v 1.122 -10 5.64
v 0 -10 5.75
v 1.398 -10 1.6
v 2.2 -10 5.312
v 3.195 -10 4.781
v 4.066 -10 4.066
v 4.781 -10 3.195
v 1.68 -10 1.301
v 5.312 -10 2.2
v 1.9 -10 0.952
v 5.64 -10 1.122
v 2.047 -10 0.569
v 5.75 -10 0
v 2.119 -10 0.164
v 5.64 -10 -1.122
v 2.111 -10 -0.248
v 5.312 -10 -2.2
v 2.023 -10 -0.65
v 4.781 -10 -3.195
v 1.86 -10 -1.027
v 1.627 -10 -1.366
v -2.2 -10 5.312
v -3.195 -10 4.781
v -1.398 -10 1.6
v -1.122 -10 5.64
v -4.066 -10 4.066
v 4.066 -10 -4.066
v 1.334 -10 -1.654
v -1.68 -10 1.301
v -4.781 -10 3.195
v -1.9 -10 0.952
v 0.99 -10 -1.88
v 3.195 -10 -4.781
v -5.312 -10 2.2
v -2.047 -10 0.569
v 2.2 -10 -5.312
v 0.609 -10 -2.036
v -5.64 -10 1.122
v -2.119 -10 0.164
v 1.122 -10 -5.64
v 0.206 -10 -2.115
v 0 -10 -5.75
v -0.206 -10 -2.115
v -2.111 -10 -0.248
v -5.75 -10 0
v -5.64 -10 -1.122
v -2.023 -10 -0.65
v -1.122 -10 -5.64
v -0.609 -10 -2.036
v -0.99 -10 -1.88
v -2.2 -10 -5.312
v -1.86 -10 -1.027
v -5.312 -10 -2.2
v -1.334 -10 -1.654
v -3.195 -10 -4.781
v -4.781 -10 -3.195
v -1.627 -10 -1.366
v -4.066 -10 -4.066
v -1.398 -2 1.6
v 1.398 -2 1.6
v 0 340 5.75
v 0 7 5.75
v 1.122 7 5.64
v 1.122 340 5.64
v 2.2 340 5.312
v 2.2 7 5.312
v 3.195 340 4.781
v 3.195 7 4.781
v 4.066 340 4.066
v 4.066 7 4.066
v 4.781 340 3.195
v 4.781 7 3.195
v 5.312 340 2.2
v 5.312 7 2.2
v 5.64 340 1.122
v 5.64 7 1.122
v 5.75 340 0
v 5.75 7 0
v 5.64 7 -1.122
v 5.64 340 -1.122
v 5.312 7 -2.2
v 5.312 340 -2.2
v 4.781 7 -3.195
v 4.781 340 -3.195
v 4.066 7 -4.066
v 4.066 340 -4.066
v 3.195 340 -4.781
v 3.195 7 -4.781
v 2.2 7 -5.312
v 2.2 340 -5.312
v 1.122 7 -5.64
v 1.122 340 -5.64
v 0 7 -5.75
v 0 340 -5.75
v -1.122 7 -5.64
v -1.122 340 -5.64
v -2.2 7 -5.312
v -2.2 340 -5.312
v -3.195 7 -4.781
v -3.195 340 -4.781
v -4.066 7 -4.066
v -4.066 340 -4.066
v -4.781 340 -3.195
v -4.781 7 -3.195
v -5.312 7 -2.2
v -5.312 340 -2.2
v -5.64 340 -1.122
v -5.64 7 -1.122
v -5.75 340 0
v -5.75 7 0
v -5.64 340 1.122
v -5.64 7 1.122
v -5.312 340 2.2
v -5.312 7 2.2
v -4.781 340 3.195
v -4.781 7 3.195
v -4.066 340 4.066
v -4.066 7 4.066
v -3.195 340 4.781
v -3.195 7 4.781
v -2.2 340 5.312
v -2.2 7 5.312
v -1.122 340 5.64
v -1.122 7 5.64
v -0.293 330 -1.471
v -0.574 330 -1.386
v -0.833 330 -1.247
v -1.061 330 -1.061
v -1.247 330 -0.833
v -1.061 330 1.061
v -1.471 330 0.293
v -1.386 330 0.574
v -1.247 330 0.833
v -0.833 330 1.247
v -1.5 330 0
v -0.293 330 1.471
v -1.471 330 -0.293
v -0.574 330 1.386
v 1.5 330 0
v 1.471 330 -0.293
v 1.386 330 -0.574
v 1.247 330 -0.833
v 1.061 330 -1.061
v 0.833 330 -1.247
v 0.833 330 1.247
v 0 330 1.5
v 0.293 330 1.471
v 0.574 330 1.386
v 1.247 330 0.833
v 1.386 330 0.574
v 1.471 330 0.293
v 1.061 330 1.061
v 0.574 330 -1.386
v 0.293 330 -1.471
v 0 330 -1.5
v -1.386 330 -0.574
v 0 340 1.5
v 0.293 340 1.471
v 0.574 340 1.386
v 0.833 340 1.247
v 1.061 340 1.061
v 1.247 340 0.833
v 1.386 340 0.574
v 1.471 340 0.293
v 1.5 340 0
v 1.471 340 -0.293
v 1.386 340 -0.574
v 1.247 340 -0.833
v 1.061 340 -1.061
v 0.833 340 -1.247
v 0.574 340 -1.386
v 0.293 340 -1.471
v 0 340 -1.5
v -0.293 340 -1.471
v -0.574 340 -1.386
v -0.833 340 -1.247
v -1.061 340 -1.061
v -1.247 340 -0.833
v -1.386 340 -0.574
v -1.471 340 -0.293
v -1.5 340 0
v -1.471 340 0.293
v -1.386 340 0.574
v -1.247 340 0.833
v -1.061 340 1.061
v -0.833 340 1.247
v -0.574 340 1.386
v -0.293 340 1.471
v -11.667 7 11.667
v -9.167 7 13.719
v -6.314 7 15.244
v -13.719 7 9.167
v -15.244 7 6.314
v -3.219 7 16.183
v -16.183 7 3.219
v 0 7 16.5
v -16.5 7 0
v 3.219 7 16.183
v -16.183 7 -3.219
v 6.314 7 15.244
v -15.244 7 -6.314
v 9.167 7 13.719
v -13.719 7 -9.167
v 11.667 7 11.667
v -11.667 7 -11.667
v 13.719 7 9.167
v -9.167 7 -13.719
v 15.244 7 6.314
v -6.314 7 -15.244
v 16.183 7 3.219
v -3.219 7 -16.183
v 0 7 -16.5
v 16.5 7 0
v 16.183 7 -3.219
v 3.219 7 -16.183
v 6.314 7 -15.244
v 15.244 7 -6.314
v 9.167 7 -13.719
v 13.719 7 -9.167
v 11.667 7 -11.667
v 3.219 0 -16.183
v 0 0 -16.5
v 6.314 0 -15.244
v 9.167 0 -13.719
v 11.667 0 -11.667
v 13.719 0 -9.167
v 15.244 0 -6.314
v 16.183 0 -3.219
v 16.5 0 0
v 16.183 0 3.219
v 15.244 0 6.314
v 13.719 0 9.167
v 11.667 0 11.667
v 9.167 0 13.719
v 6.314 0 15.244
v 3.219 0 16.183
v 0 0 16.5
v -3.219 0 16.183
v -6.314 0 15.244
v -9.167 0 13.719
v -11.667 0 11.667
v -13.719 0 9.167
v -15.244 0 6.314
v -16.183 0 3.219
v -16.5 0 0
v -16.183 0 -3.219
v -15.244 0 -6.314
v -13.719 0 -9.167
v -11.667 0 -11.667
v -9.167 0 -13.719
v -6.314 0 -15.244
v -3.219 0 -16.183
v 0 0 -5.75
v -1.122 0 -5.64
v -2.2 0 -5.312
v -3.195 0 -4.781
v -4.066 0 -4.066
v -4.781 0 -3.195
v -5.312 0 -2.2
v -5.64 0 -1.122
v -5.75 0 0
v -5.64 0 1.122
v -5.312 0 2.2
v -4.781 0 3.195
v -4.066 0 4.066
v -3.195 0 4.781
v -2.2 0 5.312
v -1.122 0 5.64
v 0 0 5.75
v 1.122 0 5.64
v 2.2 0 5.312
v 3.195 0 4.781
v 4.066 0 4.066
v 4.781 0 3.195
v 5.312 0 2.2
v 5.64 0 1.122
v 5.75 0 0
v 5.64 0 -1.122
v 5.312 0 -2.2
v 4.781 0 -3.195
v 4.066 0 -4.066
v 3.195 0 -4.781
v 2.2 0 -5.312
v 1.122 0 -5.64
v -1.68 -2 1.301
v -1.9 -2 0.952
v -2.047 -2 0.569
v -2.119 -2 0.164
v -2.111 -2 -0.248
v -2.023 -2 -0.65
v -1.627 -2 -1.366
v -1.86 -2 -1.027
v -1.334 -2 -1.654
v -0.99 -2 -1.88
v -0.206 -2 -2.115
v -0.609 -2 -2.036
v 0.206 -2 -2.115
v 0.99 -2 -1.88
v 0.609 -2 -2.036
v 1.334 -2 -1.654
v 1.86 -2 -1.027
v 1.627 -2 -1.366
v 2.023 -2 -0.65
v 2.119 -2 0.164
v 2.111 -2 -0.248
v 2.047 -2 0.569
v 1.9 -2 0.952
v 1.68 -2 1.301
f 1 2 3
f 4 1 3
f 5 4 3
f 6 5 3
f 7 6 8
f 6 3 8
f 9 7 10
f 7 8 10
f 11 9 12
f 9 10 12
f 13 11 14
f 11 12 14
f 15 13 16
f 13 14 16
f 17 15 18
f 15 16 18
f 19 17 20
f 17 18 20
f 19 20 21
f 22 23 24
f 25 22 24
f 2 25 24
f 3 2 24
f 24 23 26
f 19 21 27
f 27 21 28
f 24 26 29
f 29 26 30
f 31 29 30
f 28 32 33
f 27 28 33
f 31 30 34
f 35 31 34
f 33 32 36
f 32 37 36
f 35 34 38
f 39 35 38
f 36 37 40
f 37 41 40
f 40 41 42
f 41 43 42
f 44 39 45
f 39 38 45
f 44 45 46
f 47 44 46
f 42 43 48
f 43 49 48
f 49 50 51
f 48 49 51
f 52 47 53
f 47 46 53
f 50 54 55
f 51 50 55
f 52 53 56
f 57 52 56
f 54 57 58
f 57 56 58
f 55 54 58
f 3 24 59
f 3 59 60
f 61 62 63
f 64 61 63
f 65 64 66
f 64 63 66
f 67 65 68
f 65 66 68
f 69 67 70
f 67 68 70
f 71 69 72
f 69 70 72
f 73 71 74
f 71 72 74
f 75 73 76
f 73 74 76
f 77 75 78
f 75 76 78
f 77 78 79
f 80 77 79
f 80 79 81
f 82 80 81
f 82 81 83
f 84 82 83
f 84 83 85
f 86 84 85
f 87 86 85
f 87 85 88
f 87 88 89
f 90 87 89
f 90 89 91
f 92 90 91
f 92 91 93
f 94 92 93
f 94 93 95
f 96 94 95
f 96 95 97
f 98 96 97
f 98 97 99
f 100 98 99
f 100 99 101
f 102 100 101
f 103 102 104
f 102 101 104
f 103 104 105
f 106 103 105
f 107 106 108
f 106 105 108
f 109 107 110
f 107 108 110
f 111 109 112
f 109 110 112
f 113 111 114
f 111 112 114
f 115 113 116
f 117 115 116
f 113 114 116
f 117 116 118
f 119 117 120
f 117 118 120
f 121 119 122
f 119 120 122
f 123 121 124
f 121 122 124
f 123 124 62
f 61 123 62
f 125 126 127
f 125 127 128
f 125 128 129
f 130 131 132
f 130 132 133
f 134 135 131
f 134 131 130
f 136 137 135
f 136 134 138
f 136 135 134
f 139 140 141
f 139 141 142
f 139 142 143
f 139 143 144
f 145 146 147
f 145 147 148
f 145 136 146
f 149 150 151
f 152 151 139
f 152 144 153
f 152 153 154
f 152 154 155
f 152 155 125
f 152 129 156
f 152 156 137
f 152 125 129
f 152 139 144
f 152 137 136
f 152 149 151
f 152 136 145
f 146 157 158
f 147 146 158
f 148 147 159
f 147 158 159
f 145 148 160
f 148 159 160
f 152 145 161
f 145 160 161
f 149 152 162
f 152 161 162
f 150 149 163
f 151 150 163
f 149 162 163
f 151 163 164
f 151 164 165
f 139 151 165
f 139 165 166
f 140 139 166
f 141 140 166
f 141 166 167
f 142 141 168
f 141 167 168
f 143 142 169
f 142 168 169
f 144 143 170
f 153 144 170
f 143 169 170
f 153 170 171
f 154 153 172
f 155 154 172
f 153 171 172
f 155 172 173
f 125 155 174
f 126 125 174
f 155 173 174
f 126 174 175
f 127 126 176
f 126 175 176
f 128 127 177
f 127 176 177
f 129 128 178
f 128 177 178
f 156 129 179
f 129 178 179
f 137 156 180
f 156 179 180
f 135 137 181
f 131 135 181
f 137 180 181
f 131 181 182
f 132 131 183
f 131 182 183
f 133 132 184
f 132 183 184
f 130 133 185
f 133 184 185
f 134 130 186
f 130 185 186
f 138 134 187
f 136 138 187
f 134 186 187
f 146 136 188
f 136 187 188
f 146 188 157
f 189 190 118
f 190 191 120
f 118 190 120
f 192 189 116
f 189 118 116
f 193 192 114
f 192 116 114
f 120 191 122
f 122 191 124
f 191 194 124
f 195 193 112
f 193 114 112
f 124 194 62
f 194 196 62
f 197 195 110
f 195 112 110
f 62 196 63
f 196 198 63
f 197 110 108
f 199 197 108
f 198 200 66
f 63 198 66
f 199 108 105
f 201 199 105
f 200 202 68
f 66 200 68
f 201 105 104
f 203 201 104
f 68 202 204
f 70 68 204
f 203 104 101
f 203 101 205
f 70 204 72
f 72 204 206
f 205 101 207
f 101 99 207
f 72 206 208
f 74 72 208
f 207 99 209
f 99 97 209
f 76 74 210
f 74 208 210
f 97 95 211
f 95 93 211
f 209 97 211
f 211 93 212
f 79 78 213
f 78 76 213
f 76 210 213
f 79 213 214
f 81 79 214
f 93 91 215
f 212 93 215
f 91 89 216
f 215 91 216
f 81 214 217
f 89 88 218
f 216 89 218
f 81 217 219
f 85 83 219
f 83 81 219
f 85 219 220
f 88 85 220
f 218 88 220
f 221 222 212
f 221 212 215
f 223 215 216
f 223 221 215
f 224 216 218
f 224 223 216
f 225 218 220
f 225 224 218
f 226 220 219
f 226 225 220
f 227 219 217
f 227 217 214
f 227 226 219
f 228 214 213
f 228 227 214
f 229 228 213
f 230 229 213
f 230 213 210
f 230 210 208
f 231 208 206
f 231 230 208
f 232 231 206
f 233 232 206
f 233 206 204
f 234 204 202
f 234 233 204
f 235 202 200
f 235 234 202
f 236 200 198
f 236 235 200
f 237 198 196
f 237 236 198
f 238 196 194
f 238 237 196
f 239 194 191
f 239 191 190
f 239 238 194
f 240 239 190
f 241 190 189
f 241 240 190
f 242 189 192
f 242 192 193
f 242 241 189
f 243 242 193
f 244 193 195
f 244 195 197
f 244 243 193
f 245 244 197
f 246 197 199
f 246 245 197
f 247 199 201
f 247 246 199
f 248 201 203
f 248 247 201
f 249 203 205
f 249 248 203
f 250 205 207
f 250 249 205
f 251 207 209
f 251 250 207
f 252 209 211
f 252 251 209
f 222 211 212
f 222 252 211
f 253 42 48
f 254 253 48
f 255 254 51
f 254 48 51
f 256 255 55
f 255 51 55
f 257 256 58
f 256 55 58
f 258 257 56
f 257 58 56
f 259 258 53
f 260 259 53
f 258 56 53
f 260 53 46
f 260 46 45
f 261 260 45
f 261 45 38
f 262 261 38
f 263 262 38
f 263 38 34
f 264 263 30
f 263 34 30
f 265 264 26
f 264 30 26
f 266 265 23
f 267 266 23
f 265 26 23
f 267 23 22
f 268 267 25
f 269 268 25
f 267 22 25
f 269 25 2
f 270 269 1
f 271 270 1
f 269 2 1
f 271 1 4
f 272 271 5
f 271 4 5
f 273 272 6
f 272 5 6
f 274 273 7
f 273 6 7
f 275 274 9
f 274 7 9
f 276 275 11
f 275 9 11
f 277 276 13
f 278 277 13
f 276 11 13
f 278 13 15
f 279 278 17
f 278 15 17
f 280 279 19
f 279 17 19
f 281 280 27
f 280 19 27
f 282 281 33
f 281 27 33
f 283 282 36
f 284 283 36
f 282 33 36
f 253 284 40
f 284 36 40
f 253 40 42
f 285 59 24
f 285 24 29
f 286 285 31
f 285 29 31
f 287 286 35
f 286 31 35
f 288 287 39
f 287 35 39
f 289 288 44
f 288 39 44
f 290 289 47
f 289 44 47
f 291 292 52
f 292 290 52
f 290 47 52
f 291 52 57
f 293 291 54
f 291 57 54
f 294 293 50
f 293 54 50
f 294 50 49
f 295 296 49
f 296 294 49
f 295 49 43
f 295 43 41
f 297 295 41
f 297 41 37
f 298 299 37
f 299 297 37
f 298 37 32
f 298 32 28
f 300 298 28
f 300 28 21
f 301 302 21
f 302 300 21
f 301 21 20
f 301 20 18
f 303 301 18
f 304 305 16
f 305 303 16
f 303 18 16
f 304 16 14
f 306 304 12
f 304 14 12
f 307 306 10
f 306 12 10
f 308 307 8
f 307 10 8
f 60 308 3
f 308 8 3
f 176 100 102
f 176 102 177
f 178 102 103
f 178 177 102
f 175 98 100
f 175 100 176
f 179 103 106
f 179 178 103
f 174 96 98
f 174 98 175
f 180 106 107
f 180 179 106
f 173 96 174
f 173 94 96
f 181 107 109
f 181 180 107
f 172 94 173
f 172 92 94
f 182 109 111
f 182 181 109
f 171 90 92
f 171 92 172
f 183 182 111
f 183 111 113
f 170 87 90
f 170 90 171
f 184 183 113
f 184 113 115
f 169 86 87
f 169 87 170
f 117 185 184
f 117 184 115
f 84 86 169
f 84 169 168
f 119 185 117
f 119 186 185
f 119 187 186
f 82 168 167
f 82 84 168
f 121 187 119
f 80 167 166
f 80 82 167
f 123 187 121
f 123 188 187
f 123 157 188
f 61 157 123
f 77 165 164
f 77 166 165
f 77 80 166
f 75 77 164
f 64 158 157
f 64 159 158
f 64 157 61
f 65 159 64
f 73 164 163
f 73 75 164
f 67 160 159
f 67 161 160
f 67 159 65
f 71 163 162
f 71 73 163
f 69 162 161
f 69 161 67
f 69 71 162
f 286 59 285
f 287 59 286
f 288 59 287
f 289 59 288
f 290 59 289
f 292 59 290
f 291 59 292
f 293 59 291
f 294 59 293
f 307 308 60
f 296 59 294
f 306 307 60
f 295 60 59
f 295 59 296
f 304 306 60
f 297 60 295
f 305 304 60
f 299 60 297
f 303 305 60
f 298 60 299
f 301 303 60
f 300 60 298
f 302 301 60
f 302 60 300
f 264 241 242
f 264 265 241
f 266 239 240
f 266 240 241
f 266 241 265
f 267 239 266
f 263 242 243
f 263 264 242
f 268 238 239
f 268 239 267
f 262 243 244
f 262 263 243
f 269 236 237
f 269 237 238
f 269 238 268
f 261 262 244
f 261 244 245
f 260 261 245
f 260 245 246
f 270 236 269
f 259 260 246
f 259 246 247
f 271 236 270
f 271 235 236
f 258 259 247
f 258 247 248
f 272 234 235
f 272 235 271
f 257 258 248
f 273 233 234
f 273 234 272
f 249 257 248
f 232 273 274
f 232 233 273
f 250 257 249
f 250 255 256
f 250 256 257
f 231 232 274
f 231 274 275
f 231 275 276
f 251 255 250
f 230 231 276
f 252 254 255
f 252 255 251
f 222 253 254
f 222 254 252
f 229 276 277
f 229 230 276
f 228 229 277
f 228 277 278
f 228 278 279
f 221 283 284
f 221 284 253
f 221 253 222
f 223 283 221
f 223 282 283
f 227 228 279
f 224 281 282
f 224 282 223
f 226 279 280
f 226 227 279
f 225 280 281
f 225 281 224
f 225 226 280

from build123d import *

# Parameters (mm, degrees)
SKETCH1_R           = 5.75
SKETCH1_R_2         = 2
BOSS_EXTRUDE1_DEPTH = 340
SKETCH33_R          = 16.5
BOSS_EXTRUDE2_DEPTH = 7
BOSS_EXTRUDE5_START = -10
SKETCH1_4_R         = 5.75
SKETCH1_4_R_2       = 2
BOSS_EXTRUDE5_DEPTH = 10
SKETCH38_R          = 2.125
CUT_EXTRUDE1_DEPTH  = 8
BOSS_EXTRUDE6_START = 8
BOSS_EXTRUDE6_DEPTH = 8
SKETCH40_R          = 1.5
CUT_EXTRUDE2_DEPTH  = 10


with BuildPart() as part:
    # Sketch1 → Boss-Extrude1 (new body)
    # profile 1 of 2: a face of its own
    with BuildSketch(Plane(origin=(0, 0, 0), x_dir=(1, 0, 0), z_dir=(0, 1, 0))):
        with Locations(Location((0, 0, 0), (0, 0, 270))):
            Circle(SKETCH1_R)
        Circle(SKETCH1_R_2, mode=Mode.SUBTRACT)
    # profile 2 of 2: a face of its own
    with BuildSketch(Plane(origin=(0, 0, 0), x_dir=(1, 0, 0), z_dir=(0, 1, 0))):
        Circle(SKETCH1_R_2)
    extrude(amount=BOSS_EXTRUDE1_DEPTH)

    # Sketch33 → Boss-Extrude2 (add)
    with BuildSketch(Plane.XZ):
        with Locations(Location((0, 0, 0), (0, 0, 270))):
            Circle(SKETCH33_R)
    extrude(amount=-BOSS_EXTRUDE2_DEPTH)

    # Sketch1<4> → Boss-Extrude5 (add)
    # profile 1 of 2: a face of its own
    with BuildSketch(Plane(origin=(0, 0, 0), x_dir=(1, 0, 0), z_dir=(0, 1, 0)).offset(BOSS_EXTRUDE5_START)):
        with Locations(Location((0, 0, 0), (0, 0, 90))):
            Circle(SKETCH1_4_R)
        Circle(SKETCH1_4_R_2, mode=Mode.SUBTRACT)
    # profile 2 of 2: a face of its own
    with BuildSketch(Plane(origin=(0, 0, 0), x_dir=(1, 0, 0), z_dir=(0, 1, 0)).offset(BOSS_EXTRUDE5_START)):
        Circle(SKETCH1_4_R_2)
    extrude(amount=BOSS_EXTRUDE5_DEPTH)

    # Sketch38 → Cut-Extrude1 (cut)
    with BuildSketch(Plane.XZ.offset(10)):
        with Locations(Location((0, 0, 0), (0, 0, 270))):
            Circle(SKETCH38_R)
    extrude(amount=-CUT_EXTRUDE1_DEPTH, mode=Mode.SUBTRACT)

    # Sketch39 → Boss-Extrude6 (add)
    with BuildSketch(Plane.XZ.offset(2).offset(BOSS_EXTRUDE6_START)):
        with BuildLine():
            ThreePointArc((1.398436627, 1.6), (0, 2.125), (-1.398436627, 1.6))
            Line((-1.398436627, 1.6), (1.398436627, 1.6))
        make_face()
    extrude(amount=-BOSS_EXTRUDE6_DEPTH)

    # Sketch40 → Cut-Extrude2 (cut)
    with BuildSketch(Plane(origin=(0, 340, 0), x_dir=(1, 0, 0), z_dir=(0, 1, 0))):
        with Locations(Location((0, 0, 0), (0, 0, 270))):
            Circle(SKETCH40_R)
    extrude(amount=-CUT_EXTRUDE2_DEPTH, mode=Mode.SUBTRACT)


solid = part.part
